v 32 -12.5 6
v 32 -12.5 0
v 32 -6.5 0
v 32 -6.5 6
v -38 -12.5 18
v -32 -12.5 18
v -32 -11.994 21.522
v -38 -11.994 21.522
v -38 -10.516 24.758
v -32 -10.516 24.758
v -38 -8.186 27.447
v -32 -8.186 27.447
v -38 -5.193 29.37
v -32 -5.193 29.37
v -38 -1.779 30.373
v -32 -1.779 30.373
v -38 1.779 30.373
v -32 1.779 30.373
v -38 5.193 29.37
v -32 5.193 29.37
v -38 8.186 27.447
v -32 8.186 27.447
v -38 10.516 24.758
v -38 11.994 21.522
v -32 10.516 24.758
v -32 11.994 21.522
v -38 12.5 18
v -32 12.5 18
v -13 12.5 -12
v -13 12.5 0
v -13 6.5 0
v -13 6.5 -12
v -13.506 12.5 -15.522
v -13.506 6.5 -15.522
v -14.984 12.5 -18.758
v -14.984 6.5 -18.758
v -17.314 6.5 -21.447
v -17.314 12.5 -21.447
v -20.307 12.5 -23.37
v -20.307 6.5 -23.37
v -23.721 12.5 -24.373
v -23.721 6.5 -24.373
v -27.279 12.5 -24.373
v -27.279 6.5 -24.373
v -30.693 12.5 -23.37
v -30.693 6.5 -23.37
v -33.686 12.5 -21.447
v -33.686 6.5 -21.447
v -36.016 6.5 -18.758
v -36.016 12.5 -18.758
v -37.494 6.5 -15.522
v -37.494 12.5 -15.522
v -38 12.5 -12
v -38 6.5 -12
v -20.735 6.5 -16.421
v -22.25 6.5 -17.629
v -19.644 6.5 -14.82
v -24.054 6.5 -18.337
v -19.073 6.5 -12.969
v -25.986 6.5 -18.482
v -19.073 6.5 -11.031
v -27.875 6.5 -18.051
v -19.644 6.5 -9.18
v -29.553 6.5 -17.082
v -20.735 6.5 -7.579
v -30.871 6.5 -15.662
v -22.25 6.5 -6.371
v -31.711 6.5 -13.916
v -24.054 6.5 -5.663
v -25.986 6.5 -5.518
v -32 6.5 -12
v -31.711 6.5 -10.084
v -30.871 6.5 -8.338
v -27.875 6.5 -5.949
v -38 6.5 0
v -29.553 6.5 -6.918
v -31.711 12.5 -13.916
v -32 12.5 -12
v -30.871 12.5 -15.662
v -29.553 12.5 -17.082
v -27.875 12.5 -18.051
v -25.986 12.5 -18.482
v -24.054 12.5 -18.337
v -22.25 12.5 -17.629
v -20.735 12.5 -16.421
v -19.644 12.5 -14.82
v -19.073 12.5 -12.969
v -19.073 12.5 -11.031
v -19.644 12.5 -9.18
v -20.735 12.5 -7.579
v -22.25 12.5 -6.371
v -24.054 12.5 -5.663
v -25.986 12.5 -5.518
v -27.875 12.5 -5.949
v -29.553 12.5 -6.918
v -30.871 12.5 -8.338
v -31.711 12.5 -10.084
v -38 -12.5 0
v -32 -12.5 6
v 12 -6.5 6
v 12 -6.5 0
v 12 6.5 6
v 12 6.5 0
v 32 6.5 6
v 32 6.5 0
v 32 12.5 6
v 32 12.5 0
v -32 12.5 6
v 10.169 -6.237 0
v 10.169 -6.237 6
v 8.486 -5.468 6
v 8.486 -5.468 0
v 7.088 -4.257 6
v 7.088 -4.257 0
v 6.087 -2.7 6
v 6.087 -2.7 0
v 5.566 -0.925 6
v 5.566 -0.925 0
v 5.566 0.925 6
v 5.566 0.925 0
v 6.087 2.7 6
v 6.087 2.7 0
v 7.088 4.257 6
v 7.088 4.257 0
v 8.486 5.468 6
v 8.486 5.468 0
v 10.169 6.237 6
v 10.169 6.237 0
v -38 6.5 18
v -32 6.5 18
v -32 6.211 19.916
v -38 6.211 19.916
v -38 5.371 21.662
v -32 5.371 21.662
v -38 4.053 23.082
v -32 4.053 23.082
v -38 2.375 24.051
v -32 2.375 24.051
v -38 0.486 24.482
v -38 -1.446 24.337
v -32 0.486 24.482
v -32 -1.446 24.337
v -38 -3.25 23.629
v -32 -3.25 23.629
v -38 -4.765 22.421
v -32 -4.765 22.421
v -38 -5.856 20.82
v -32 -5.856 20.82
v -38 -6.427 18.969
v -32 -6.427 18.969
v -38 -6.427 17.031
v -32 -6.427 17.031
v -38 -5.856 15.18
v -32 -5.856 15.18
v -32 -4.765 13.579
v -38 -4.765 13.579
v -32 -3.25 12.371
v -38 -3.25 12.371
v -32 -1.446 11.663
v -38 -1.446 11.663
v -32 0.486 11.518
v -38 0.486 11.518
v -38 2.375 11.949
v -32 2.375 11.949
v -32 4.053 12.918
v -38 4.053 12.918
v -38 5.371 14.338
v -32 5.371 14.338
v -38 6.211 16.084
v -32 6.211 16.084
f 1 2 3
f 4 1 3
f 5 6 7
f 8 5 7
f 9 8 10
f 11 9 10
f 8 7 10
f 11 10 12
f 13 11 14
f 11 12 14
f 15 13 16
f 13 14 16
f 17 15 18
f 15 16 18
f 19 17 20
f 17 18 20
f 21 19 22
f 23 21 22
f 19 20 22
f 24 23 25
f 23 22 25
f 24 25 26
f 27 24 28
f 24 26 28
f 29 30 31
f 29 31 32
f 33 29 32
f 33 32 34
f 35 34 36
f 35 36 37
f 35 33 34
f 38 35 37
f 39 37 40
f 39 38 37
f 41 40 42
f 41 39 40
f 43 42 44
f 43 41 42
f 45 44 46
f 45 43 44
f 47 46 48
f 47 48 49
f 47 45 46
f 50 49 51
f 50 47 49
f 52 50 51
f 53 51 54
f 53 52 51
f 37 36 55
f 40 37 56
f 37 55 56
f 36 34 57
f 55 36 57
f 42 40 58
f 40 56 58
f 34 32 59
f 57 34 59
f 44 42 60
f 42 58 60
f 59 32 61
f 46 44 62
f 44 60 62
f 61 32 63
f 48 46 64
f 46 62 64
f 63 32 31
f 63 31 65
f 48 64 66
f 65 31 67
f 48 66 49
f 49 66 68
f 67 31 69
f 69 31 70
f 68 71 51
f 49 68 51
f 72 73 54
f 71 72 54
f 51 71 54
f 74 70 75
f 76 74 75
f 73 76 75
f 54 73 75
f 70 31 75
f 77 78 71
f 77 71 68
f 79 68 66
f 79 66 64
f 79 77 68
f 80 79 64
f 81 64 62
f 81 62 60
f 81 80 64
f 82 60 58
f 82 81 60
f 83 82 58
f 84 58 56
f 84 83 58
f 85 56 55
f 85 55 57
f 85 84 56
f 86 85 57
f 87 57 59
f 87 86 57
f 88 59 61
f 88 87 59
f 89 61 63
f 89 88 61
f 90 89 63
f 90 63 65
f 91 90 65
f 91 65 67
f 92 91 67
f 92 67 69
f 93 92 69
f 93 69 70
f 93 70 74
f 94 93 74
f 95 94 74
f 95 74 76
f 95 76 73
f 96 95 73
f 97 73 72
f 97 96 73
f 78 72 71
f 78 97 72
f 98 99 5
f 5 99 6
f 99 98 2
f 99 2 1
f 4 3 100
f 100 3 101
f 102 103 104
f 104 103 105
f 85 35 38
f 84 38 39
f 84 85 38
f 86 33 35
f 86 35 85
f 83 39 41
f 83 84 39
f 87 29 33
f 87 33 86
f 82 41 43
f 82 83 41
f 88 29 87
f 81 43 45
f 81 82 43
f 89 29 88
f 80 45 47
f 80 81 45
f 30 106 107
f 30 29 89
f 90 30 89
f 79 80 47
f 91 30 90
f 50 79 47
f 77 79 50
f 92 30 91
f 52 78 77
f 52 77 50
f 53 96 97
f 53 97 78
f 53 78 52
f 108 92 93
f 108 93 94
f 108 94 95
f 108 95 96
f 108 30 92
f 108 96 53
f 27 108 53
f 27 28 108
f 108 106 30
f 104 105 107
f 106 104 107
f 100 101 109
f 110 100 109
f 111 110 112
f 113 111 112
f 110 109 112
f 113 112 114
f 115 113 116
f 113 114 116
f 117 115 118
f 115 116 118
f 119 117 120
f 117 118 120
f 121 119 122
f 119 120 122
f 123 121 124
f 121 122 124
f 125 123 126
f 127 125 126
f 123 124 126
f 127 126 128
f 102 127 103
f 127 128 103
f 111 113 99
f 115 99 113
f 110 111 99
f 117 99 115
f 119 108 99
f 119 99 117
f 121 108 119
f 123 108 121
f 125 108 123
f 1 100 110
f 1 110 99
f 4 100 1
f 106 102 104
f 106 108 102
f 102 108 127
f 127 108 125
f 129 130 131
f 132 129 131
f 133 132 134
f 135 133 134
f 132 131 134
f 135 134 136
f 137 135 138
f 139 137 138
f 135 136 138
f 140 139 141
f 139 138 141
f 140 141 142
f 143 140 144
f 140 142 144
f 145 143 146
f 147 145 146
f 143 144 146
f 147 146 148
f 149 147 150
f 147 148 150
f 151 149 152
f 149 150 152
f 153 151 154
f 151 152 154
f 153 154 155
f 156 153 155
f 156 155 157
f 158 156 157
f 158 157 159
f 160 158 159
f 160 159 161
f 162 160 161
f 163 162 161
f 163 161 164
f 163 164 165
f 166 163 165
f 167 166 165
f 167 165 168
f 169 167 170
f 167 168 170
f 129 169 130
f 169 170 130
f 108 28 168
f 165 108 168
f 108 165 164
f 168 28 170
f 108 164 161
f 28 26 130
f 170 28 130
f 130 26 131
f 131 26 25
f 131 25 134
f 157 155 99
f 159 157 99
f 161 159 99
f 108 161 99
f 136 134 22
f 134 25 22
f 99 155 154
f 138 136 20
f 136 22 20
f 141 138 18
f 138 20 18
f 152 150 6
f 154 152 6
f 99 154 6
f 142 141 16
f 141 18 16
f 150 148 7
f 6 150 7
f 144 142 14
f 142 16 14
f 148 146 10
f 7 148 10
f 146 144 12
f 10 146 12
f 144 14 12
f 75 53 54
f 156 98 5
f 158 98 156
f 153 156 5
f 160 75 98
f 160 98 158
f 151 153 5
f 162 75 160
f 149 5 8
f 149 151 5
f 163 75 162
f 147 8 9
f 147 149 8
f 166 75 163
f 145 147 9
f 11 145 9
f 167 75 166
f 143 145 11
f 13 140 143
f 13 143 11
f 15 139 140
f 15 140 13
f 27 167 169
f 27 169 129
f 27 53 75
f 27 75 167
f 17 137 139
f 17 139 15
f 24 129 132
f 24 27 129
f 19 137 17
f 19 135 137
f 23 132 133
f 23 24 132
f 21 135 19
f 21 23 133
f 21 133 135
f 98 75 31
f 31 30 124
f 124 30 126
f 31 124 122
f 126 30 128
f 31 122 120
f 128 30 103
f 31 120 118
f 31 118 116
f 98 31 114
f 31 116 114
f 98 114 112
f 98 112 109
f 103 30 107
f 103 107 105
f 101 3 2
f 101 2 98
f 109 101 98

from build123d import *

# Parameters (mm, degrees)
F1_DEPTH = 6
F2_W     = 25
F2_H     = 6
F3_DEPTH = 6
F5_DEPTH = 6


with BuildPart() as f1:
    # F0 (on Top) → F1 (new body)
    with BuildSketch(Plane.XY):
        with BuildLine():
            Line((-32, -12.5), (32, -12.5))
            Line((32, -12.5), (32, -6.5))
            Line((32, -6.5), (12, -6.5))
            ThreePointArc((12, -6.5), (5.5, 0), (12, 6.5))
            Line((12, 6.5), (32, 6.5))
            Line((32, 6.5), (32, 12.5))
            Line((32, 12.5), (-32, 12.5))
            Line((-32, 12.5), (-32, -12.5))
        make_face()
    extrude(amount=F1_DEPTH)

    # F2 (on face) → F3 (join)
    with BuildSketch(Plane(origin=(-32, 0, 0), x_dir=(0, -1, 0), z_dir=(-1, 0, 0))):
        with Locations((0, 3)):
            Rectangle(F2_W, F2_H)
        with BuildLine():
            ThreePointArc((12.5, 18), (0, 30.5), (-12.5, 18))
            Line((-12.5, 18), (-6.5, 18))
            ThreePointArc((-6.5, 18), (0, 24.5), (6.5, 18))
            Line((6.5, 18), (12.5, 18))
        make_face()
        with BuildLine():
            Line((-12.5, 18), (-12.5, 6))
            Line((-12.5, 6), (12.5, 6))
            Line((12.5, 6), (12.5, 18))
            Line((12.5, 18), (6.5, 18))
            ThreePointArc((6.5, 18), (0, 11.5), (-6.5, 18))
            Line((-6.5, 18), (-12.5, 18))
        make_face()
    extrude(amount=F3_DEPTH)

    # F4 (on face) → F5 (join)
    with BuildSketch(Plane(origin=(0, 12.5, 0), x_dir=(-1, 0, 0), z_dir=(0, 1, 0))):
        with BuildLine():
            Line((38, -12), (38, 6))
            Line((38, 6), (13, 6))
            Line((13, 6), (13, -12))
            ThreePointArc((13, -12), (25.5, 0.5), (38, -12))
        make_face()
        with BuildLine():
            ThreePointArc((13, -12), (25.5, -24.5), (38, -12))
            Line((38, -12), (32, -12))
            ThreePointArc((32, -12), (25.5, -18.5), (19, -12))
            Line((19, -12), (13, -12))
        make_face()
        with BuildLine():
            Line((32, -12), (38, -12))
            ThreePointArc((38, -12), (25.5, 0.5), (13, -12))
            Line((13, -12), (19, -12))
            ThreePointArc((19, -12), (25.5, -5.5), (32, -12))
        make_face()
    extrude(amount=-F5_DEPTH)


solid = f1.part
